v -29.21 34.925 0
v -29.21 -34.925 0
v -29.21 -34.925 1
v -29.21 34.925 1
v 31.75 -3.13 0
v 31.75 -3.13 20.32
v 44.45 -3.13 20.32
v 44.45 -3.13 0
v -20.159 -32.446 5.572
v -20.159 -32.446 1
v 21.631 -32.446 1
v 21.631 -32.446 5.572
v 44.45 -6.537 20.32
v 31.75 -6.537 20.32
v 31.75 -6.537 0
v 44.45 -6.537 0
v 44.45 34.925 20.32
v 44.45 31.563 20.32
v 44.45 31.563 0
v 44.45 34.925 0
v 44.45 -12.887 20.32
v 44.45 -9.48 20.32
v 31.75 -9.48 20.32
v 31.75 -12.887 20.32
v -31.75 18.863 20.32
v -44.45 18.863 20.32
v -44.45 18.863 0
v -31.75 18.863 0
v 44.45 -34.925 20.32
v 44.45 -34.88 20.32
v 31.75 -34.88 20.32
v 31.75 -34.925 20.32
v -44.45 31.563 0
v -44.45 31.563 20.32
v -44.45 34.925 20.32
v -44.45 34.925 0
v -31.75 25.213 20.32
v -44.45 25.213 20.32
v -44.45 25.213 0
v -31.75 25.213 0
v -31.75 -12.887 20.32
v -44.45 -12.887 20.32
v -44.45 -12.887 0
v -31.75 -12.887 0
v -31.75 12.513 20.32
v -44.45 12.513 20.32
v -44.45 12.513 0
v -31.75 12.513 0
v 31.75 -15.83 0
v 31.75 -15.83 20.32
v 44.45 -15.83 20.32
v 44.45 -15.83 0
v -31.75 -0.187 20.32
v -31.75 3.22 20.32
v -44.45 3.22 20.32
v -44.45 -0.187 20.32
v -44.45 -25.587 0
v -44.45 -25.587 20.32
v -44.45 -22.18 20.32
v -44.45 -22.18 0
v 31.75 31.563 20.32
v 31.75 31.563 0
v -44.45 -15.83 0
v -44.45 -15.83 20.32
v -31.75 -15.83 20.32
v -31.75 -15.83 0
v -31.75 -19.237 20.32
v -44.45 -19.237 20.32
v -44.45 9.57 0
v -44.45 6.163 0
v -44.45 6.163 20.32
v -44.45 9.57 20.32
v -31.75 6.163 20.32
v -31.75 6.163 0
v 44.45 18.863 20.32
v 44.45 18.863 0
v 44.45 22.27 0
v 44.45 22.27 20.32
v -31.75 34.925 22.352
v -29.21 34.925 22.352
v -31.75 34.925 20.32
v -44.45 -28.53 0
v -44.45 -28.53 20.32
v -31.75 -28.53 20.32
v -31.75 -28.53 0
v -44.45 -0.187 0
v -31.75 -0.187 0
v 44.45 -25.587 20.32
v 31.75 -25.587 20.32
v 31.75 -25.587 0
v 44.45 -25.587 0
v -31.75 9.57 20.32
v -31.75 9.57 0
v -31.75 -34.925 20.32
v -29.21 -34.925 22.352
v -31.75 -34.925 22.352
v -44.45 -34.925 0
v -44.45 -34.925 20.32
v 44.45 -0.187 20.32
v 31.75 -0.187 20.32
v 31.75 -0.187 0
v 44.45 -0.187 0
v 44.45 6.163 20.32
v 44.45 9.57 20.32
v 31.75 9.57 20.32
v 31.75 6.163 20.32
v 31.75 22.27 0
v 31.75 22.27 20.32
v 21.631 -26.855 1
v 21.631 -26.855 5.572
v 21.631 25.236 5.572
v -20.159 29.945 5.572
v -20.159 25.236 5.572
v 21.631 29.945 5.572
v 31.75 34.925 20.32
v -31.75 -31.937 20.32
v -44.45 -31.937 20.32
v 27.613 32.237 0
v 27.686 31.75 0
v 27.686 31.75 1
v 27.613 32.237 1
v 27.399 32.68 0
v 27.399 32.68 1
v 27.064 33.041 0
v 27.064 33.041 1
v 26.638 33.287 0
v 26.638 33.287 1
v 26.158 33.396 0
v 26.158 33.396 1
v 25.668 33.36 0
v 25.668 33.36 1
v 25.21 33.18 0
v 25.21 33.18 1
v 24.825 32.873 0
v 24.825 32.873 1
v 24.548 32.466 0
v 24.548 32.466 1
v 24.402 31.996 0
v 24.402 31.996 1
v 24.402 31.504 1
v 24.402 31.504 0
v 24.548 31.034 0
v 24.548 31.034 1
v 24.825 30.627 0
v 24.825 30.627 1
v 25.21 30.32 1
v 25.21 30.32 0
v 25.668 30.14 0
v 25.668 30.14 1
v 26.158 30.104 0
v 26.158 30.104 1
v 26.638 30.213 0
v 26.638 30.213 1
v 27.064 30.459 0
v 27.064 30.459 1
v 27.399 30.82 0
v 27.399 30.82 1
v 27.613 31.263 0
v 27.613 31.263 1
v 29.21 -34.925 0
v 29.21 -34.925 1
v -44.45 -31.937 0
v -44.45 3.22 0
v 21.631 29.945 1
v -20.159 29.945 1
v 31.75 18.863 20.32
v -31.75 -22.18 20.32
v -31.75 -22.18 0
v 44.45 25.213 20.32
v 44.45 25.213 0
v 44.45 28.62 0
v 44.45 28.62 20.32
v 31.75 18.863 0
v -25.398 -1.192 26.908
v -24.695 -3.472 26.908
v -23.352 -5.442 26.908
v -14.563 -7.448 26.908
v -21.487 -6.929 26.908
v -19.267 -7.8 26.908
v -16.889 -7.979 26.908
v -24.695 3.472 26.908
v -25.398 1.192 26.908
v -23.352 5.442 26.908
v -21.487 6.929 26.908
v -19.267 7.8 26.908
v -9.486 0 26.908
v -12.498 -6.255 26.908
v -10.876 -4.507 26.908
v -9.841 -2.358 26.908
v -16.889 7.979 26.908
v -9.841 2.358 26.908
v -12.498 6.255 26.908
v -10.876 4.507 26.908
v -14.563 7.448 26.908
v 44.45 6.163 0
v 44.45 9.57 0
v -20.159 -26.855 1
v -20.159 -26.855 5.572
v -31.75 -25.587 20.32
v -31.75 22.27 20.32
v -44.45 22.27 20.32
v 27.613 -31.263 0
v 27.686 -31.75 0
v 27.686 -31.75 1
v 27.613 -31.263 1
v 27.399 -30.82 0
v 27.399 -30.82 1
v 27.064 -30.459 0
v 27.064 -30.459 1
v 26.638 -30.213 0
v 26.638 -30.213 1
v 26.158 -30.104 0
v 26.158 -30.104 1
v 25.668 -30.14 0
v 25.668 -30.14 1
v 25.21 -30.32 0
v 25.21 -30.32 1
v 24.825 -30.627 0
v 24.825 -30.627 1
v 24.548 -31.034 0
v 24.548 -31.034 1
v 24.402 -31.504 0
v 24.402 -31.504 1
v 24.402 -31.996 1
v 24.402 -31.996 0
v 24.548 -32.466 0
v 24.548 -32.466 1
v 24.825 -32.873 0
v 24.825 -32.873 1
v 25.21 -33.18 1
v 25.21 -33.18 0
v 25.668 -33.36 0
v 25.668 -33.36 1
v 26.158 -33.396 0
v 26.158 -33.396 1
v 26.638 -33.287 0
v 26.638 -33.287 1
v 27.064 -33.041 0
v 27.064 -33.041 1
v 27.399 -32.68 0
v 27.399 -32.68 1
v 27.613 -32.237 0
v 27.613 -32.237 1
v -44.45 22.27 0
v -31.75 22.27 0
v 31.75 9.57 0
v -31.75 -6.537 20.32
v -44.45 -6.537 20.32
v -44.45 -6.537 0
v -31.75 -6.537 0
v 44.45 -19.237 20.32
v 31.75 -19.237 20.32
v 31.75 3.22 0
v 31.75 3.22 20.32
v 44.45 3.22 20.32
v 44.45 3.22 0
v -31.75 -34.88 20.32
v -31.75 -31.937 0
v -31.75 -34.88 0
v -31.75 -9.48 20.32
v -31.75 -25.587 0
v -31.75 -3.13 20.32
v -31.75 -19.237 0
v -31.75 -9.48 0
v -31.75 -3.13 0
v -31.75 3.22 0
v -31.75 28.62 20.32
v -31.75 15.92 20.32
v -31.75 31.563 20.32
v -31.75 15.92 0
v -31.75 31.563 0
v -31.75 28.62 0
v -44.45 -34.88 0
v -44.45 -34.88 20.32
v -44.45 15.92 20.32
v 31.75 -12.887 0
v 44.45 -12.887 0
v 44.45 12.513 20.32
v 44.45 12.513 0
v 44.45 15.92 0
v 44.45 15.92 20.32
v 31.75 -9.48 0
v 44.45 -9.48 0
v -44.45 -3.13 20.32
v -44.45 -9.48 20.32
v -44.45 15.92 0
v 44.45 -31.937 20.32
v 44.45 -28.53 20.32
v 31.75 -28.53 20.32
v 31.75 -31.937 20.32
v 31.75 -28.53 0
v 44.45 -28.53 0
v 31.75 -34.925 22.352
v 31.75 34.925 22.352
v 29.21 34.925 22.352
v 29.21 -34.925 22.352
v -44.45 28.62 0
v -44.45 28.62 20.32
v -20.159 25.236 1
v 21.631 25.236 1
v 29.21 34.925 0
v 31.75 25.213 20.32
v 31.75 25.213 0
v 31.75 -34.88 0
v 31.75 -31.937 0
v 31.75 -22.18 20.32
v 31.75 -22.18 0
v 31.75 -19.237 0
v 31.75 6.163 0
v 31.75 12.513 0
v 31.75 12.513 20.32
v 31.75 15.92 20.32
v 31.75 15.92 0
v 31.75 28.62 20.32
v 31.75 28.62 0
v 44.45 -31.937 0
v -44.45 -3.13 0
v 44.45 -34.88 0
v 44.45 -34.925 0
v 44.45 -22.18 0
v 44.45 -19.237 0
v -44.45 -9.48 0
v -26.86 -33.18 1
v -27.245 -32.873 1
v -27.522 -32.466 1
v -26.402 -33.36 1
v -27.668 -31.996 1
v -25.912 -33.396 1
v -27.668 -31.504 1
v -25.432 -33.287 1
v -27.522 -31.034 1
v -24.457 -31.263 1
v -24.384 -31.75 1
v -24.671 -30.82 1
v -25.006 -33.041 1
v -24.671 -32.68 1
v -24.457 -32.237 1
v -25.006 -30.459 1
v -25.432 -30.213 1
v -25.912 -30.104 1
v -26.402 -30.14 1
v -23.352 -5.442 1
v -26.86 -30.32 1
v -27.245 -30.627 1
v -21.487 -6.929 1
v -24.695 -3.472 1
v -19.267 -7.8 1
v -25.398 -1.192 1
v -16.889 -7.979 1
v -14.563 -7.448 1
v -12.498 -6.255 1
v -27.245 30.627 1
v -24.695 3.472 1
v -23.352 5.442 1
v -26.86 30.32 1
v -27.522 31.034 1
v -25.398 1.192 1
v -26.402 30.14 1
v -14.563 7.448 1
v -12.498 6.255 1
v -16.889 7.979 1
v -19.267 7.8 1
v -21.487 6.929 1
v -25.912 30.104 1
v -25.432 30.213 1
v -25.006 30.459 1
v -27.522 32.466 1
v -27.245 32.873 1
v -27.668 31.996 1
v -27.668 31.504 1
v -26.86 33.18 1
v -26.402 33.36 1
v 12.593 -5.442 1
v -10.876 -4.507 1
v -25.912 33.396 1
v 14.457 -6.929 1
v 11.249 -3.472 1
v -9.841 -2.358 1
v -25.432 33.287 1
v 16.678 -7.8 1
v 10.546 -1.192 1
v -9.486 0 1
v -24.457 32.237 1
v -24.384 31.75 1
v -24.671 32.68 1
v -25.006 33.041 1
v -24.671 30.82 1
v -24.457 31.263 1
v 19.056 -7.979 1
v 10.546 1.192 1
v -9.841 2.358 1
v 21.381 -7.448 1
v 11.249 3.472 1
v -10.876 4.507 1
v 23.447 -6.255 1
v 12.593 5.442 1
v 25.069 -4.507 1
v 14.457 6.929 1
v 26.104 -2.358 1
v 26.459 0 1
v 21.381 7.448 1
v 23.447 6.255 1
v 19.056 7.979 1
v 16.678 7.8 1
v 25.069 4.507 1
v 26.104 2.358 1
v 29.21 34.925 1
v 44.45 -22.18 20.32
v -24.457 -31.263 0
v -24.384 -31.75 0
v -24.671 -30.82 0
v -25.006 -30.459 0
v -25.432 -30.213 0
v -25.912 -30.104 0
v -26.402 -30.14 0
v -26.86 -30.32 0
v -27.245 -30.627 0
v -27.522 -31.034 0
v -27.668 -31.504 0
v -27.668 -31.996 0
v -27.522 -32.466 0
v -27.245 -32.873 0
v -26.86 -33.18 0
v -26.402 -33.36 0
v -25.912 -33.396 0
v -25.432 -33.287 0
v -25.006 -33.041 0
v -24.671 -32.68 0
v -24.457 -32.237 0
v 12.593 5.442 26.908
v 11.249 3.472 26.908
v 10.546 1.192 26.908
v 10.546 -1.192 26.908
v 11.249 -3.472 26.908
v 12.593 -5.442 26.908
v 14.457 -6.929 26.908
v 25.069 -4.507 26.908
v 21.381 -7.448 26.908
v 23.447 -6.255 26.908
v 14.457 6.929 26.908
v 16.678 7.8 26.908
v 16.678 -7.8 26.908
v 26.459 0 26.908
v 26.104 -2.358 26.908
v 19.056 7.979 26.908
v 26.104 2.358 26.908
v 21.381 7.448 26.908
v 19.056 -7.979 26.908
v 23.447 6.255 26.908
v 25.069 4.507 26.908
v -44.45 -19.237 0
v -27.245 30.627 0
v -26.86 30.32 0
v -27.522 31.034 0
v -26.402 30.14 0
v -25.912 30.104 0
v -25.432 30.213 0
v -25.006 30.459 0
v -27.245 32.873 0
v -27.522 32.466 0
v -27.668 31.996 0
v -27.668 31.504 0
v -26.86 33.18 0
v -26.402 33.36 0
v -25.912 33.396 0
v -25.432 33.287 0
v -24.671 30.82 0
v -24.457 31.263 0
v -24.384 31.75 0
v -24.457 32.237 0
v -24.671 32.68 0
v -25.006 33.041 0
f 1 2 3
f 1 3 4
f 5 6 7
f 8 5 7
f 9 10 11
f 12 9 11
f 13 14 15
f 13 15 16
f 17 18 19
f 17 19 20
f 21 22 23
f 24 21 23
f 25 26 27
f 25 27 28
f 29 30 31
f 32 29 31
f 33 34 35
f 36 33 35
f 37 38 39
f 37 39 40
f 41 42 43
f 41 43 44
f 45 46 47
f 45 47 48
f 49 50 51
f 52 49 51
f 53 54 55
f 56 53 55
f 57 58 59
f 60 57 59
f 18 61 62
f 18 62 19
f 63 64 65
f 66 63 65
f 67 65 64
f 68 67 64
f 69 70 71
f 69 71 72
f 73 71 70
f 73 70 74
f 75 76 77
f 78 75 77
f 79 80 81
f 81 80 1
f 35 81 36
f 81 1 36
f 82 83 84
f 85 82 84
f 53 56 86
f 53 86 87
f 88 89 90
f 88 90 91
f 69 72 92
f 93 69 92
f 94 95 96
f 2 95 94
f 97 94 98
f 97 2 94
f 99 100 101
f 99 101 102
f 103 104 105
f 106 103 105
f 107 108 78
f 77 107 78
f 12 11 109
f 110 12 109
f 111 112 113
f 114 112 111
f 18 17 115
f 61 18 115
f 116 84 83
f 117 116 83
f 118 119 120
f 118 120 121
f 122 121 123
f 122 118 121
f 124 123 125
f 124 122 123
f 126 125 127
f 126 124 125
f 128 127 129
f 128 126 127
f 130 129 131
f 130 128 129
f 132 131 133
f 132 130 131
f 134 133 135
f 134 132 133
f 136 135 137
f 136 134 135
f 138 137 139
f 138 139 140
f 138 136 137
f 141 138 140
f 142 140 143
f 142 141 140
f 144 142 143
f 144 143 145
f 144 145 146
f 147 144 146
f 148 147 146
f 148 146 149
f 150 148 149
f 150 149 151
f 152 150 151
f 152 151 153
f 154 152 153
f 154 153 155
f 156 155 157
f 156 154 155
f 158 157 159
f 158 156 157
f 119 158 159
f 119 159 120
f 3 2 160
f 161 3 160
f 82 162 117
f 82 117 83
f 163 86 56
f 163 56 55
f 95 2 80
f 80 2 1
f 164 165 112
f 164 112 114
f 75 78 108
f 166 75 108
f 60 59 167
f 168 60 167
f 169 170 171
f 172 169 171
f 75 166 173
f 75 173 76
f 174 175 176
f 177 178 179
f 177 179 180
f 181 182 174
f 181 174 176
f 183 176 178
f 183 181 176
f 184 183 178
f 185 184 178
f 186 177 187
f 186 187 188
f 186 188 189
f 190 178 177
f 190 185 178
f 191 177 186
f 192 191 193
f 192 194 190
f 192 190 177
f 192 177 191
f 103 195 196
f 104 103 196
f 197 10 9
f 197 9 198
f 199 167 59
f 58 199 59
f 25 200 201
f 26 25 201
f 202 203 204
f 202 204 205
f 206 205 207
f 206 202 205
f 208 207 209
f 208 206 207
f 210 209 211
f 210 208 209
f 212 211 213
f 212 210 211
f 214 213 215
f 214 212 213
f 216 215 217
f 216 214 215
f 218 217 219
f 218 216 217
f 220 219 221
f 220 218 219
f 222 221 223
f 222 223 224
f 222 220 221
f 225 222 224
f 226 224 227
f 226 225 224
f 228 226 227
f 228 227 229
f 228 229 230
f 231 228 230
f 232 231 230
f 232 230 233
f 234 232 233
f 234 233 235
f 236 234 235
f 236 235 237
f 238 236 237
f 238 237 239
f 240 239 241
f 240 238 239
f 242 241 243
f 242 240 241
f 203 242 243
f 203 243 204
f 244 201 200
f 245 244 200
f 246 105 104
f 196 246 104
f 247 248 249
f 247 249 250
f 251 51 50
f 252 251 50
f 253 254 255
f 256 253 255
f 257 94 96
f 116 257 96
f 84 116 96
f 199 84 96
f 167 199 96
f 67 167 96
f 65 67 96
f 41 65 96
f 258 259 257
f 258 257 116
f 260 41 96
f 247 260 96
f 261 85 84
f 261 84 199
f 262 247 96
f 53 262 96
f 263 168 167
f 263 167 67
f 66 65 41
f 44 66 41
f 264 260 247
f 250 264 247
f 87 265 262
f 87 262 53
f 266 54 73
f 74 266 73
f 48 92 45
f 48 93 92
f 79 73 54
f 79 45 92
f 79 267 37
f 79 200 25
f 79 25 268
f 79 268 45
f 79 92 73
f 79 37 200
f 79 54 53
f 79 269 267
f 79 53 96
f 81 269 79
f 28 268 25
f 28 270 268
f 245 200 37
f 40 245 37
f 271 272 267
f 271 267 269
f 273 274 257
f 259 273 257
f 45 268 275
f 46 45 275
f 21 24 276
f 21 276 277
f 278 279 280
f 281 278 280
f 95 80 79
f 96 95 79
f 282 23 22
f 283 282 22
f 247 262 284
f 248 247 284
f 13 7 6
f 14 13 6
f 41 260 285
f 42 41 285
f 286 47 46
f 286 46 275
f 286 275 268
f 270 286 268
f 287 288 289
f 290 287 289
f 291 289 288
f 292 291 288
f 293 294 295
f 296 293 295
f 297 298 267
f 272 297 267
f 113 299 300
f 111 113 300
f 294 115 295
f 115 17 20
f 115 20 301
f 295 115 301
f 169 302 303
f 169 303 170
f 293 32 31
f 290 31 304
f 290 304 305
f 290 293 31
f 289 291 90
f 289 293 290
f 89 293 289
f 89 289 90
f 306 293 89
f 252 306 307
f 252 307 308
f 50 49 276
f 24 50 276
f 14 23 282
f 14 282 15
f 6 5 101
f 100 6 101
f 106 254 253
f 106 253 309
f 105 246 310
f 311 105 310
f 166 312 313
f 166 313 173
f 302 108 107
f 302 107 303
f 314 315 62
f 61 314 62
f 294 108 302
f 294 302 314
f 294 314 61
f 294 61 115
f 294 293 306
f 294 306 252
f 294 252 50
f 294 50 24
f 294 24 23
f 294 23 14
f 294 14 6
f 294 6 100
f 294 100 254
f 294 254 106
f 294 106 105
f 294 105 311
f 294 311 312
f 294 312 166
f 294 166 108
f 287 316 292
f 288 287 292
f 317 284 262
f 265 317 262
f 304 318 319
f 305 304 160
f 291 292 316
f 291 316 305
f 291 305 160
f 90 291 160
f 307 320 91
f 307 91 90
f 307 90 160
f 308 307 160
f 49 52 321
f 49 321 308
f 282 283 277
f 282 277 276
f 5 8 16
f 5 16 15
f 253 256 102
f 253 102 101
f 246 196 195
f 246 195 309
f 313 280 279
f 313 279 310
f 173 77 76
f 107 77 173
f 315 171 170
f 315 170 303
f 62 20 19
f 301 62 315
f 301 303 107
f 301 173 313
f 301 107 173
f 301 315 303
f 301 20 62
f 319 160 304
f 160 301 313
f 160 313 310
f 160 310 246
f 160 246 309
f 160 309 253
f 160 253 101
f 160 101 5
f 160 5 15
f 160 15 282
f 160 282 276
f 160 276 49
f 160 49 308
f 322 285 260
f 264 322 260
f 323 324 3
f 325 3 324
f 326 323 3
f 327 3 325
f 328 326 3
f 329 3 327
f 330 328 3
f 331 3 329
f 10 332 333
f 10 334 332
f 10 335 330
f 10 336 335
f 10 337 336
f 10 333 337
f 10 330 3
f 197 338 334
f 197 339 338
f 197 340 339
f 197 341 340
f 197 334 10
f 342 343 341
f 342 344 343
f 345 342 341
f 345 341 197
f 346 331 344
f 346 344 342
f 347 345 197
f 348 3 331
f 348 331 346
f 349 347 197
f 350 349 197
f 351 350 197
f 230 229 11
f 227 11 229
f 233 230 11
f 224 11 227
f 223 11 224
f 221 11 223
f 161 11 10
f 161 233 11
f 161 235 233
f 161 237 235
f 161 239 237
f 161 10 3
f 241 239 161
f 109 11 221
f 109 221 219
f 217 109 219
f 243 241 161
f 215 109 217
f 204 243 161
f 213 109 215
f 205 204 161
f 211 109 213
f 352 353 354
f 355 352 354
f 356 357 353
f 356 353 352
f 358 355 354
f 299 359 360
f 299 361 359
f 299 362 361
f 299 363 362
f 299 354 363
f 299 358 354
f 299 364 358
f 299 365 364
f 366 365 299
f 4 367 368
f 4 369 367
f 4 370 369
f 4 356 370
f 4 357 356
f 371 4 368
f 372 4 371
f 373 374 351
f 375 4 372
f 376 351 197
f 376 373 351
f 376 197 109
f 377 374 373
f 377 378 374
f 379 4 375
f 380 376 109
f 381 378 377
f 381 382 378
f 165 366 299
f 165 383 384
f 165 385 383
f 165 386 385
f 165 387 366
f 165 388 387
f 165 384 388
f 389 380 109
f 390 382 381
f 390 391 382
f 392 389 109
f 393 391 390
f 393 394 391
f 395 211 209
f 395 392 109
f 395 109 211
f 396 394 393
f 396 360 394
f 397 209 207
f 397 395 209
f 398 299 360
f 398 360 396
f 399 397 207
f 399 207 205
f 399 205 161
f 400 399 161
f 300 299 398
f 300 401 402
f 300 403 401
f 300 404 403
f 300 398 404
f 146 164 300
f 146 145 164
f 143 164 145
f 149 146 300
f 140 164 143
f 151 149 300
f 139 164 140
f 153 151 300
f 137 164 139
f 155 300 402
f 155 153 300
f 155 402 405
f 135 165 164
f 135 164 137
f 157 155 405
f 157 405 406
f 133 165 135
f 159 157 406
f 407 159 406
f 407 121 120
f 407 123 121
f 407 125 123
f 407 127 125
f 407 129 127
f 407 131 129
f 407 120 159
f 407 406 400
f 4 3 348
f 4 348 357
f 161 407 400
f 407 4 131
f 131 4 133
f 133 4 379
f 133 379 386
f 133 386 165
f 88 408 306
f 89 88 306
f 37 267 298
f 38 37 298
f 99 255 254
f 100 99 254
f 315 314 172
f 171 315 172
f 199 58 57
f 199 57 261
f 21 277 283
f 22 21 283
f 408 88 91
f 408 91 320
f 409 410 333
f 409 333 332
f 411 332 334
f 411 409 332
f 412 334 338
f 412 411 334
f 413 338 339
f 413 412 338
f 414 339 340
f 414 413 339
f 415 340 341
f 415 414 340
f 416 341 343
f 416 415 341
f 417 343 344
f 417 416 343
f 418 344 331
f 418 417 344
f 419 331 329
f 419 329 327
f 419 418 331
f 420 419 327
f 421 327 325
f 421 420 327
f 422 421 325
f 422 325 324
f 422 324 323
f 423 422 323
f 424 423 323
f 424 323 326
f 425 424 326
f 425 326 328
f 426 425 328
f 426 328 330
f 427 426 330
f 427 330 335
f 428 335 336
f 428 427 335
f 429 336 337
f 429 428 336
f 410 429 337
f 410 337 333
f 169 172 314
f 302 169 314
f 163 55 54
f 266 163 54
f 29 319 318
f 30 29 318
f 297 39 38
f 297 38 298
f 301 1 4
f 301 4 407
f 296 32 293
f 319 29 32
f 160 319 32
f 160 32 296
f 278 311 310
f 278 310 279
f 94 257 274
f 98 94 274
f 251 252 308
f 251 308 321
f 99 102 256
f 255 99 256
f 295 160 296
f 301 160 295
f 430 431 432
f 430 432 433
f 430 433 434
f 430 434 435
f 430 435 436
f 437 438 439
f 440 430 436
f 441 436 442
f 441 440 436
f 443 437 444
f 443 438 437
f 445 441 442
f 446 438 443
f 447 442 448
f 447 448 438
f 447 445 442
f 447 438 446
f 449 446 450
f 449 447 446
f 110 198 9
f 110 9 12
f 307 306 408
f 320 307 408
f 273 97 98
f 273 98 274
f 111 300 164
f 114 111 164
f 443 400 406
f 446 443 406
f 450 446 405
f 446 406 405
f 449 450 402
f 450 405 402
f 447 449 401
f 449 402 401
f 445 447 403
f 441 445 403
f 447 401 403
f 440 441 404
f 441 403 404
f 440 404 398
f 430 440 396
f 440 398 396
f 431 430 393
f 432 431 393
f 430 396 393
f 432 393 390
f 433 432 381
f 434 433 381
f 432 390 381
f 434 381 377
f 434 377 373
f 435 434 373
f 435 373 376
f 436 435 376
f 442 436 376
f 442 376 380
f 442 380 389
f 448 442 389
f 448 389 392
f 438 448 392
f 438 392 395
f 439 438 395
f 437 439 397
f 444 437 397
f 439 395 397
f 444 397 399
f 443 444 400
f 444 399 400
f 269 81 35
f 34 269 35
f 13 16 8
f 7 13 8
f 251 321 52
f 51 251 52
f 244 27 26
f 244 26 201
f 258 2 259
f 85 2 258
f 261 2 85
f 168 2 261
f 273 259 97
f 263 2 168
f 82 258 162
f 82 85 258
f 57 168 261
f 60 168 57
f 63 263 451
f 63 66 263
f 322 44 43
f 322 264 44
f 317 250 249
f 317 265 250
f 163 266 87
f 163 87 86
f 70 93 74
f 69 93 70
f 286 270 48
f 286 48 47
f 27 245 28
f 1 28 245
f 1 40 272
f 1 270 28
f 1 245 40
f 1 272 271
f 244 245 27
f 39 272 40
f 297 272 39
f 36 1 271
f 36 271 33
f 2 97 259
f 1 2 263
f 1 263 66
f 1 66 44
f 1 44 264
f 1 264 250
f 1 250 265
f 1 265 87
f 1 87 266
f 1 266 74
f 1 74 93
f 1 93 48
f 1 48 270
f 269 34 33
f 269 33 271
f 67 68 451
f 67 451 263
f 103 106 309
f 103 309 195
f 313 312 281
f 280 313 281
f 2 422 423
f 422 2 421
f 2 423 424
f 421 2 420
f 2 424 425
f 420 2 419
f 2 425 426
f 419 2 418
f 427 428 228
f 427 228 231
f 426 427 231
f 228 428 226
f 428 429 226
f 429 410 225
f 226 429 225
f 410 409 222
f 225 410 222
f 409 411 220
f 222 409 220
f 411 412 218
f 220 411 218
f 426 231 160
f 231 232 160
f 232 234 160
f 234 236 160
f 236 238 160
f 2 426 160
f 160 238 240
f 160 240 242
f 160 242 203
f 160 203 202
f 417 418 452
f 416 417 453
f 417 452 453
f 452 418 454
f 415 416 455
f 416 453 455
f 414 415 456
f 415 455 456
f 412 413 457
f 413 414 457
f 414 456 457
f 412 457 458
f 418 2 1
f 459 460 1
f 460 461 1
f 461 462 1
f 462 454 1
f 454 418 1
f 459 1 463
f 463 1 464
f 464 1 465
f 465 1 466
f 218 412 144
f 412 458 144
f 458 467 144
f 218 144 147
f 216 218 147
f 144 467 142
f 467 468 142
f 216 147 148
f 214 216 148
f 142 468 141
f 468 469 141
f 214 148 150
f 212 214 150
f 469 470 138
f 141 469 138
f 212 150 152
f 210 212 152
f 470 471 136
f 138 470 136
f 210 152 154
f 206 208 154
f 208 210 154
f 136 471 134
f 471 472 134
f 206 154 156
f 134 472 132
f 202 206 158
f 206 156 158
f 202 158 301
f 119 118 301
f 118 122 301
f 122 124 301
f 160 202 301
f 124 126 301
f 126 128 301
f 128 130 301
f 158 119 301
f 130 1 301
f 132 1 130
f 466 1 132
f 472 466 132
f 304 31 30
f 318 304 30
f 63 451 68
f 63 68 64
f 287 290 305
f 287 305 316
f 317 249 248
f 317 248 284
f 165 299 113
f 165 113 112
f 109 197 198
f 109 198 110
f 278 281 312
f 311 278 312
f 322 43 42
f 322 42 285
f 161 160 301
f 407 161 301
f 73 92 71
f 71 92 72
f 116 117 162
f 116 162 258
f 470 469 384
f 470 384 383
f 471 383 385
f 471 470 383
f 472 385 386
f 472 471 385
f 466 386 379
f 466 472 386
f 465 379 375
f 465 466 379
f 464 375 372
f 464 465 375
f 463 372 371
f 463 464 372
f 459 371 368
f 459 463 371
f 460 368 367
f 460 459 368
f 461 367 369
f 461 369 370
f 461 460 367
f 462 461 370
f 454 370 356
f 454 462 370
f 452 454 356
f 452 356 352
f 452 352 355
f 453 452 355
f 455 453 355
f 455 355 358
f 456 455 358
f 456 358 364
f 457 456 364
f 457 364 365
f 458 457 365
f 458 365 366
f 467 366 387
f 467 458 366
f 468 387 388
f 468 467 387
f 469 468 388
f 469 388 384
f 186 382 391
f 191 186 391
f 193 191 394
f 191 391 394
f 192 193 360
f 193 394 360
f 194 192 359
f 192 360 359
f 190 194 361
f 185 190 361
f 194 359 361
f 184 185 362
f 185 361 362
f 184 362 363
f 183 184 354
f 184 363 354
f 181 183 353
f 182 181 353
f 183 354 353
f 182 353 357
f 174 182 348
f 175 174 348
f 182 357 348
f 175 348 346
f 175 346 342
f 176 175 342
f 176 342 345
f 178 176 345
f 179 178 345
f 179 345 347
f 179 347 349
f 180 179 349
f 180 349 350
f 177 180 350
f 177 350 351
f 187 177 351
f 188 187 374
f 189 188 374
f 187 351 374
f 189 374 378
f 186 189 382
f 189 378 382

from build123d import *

# Parameters (mm, degrees)
SKETCH1_W             = 58.42
SKETCH1_H             = 69.85
SKETCH1_R             = 1.651
BOSS_EXTRUDE1_DEPTH   = 1
SKETCH2_W             = 2.54
SKETCH2_H             = 69.85
BOSS_EXTRUDE2_DEPTH   = 22.352
BOSS_EXTRUDE2_2_DEPTH = 22.352
SKETCH2_3_W           = 12.7
SKETCH2_3_H           = 69.85
BOSS_EXTRUDE3_DEPTH   = 20.32
SKETCH3_W             = 12.7
SKETCH3_H             = 2.942970032
CUT_EXTRUDE3_DEPTH    = 37.084
SKETCH4_R             = 8.001
BOSS_EXTRUDE4_DEPTH   = 25.908
SKETCH5_W             = 41.790174447
SKETCH5_H             = 4.70875205
SKETCH5_H_2           = 5.59164306
BOSS_EXTRUDE5_DEPTH   = 4.572


with BuildPart() as part:
    # Sketch1 → Boss-Extrude1 (new body)
    with BuildSketch(Plane.XY):
        Rectangle(SKETCH1_W, SKETCH1_H)
        with Locations((-26.035, 31.75)):
            Circle(SKETCH1_R, mode=Mode.SUBTRACT)
        with Locations((-26.035, -31.75)):
            Circle(SKETCH1_R, mode=Mode.SUBTRACT)
        with Locations((26.035, -31.75)):
            Circle(SKETCH1_R, mode=Mode.SUBTRACT)
        with Locations((26.035, 31.75)):
            Circle(SKETCH1_R, mode=Mode.SUBTRACT)
    extrude(amount=BOSS_EXTRUDE1_DEPTH)

    # Sketch4 → Boss-Extrude4 (add)
    with BuildSketch(Plane.XY.offset(1)):
        with Locations((-17.486501, 0)):
            Circle(SKETCH4_R)
        with Locations((18.457973277, 0)):
            Circle(SKETCH4_R)
    extrude(amount=BOSS_EXTRUDE4_DEPTH)

    # Sketch5 → Boss-Extrude5 (add)
    with BuildSketch(Plane.XY.offset(1)):
        with Locations((0.735742508, 27.590344045)):
            Rectangle(SKETCH5_W, SKETCH5_H)
        with Locations((0.735742508, -29.650423067)):
            Rectangle(SKETCH5_W, SKETCH5_H_2)
    extrude(amount=BOSS_EXTRUDE5_DEPTH)


with BuildPart() as body_2:
    # Sketch2 → Boss-Extrude2 (new body)
    with BuildSketch(Plane(origin=(0, 0, 0), x_dir=(-1, 0, 0), z_dir=(0, 0, -1))):
        with Locations((30.48, 0)):
            Rectangle(SKETCH2_W, SKETCH2_H)
    extrude(amount=-BOSS_EXTRUDE2_DEPTH)



with BuildPart() as body_3:
    # Sketch2 → Boss-Extrude2 2 (new body)
    with BuildSketch(Plane(origin=(0, 0, 0), x_dir=(-1, 0, 0), z_dir=(0, 0, -1))):
        with Locations((-30.48, 0)):
            Rectangle(SKETCH2_W, SKETCH2_H)
    extrude(amount=-BOSS_EXTRUDE2_2_DEPTH)


with BuildPart() as body_2_1:
    add(body_2.part)

    add(body_3.part)  # Boss-Extrude3 merges body 3
    # Sketch2<3> → Boss-Extrude3 (add)
    with BuildSketch(Plane(origin=(0, 0, 0), x_dir=(-1, 0, 0), z_dir=(0, 0, -1))):
        with Locations((38.1, 0)):
            Rectangle(SKETCH2_3_W, SKETCH2_3_H)
        with Locations((-38.1, 0)):
            Rectangle(SKETCH2_3_W, SKETCH2_3_H)
    extrude(amount=-BOSS_EXTRUDE3_DEPTH)

    # Sketch3 → Cut-Extrude3 (cut)
    with BuildSketch(Plane.XY.offset(22.352)):
        with Locations((-38.1, 30.091868572)):
            Rectangle(SKETCH3_W, SKETCH3_H)
        with Locations((-38.1, 23.741868572)):
            Rectangle(SKETCH3_W, SKETCH3_H)
        with Locations((-38.1, 17.391868572)):
            Rectangle(SKETCH3_W, SKETCH3_H)
        with Locations((-38.1, 11.041868572)):
            Rectangle(SKETCH3_W, SKETCH3_H)
        with Locations((-38.1, 4.691868572)):
            Rectangle(SKETCH3_W, SKETCH3_H)
        with Locations((-38.1, -8.008131428)):
            Rectangle(SKETCH3_W, SKETCH3_H)
        with Locations((-38.1, -14.358131428)):
            Rectangle(SKETCH3_W, SKETCH3_H)
        with Locations((-38.1, -20.708131428)):
            Rectangle(SKETCH3_W, SKETCH3_H)
        with Locations((-38.1, -27.058131428)):
            Rectangle(SKETCH3_W, SKETCH3_H)
        with Locations((38.1, -33.408131428)):
            Rectangle(SKETCH3_W, SKETCH3_H)
        with Locations((38.1, -27.058131428)):
            Rectangle(SKETCH3_W, SKETCH3_H)
        with Locations((38.1, -20.708131428)):
            Rectangle(SKETCH3_W, SKETCH3_H)
        with Locations((38.1, -1.658131428)):
            Rectangle(SKETCH3_W, SKETCH3_H)
        with Locations((38.1, 4.691868572)):
            Rectangle(SKETCH3_W, SKETCH3_H)
        with Locations((38.1, 11.041868572)):
            Rectangle(SKETCH3_W, SKETCH3_H)
        with Locations((38.1, 17.391868572)):
            Rectangle(SKETCH3_W, SKETCH3_H)
        with Locations((38.1, 30.091868572)):
            Rectangle(SKETCH3_W, SKETCH3_H)
        with Locations((-38.1, -1.658131428)):
            Rectangle(SKETCH3_W, SKETCH3_H)
        with Locations((-38.1, -33.408131428)):
            Rectangle(SKETCH3_W, SKETCH3_H)
        with Locations((38.1, -14.358131428)):
            Rectangle(SKETCH3_W, SKETCH3_H)
        with Locations((38.1, -8.008131428)):
            Rectangle(SKETCH3_W, SKETCH3_H)
        with Locations((38.1, 23.741868572)):
            Rectangle(SKETCH3_W, SKETCH3_H)
    extrude(amount=-CUT_EXTRUDE3_DEPTH, mode=Mode.SUBTRACT)


solid = Compound([part.part, body_2_1.part])
